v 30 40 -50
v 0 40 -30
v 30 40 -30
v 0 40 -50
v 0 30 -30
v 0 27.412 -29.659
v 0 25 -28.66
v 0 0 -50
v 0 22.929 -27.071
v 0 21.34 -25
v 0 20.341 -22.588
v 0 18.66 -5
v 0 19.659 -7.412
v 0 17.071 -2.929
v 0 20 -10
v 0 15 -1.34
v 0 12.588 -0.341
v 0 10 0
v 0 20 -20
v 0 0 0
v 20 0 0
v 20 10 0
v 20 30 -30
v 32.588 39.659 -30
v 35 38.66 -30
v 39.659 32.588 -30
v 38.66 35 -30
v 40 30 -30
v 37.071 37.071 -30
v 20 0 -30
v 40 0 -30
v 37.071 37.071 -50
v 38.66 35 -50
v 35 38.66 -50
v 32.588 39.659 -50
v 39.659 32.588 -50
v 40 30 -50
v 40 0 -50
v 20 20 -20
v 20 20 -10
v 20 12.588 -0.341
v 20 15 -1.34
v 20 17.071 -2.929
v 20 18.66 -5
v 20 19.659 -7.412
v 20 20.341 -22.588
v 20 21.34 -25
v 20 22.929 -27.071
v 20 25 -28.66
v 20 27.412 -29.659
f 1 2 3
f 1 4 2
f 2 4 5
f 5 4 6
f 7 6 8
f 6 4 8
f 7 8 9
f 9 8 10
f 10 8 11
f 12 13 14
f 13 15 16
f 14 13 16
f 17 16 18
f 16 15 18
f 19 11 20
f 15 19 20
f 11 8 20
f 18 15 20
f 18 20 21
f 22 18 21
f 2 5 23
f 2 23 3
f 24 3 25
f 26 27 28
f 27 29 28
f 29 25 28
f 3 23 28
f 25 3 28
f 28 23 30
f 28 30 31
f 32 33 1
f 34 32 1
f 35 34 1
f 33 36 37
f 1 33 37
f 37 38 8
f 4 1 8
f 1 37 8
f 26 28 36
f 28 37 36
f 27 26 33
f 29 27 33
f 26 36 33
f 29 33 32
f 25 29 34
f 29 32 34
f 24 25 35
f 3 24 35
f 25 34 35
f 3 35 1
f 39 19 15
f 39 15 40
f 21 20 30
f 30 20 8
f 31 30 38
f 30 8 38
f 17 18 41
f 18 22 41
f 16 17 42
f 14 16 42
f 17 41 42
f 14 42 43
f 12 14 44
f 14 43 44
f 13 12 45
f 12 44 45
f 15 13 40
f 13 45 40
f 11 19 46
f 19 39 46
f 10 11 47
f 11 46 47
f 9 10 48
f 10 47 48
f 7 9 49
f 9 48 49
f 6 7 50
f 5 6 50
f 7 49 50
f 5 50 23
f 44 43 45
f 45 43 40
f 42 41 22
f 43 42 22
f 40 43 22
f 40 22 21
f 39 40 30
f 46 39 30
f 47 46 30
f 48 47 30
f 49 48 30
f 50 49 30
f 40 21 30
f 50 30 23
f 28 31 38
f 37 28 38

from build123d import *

# Parameters (mm, degrees)
SKETCH_1_W      = 20
SKETCH_1_H      = 30
EXTRUDE_1_DEPTH = 20
EXTRUDE_2_DEPTH = 40
FILLET_1_R      = 10


with BuildPart() as part:
    # 草圖1 → 填料-伸長1 (new body)
    with BuildSketch(Plane(origin=(0, 0, 0), x_dir=(1, 0, 0), z_dir=(0, 1, 0))):
        with Locations((10, 15)):
            Rectangle(SKETCH_1_W, SKETCH_1_H)
    extrude(amount=EXTRUDE_1_DEPTH)

    # 草圖1<3> → 填料-伸長2 (add)
    with BuildSketch(Plane(origin=(0, 0, 0), x_dir=(1, 0, 0), z_dir=(0, 1, 0))):
        Polygon((0, 50), (0, 30), (20, 30), (40, 30), (40, 50), align=None)
    extrude(amount=EXTRUDE_2_DEPTH)

    # 圓角1
    fillet_1_edges = [part.edges().sort_by_distance(p)[0] for p in [
        (10, 20, 0),
        (10, 20, -30),
        (40, 40, -40),
    ]]
    fillet(fillet_1_edges, radius=FILLET_1_R)


solid = part.part
